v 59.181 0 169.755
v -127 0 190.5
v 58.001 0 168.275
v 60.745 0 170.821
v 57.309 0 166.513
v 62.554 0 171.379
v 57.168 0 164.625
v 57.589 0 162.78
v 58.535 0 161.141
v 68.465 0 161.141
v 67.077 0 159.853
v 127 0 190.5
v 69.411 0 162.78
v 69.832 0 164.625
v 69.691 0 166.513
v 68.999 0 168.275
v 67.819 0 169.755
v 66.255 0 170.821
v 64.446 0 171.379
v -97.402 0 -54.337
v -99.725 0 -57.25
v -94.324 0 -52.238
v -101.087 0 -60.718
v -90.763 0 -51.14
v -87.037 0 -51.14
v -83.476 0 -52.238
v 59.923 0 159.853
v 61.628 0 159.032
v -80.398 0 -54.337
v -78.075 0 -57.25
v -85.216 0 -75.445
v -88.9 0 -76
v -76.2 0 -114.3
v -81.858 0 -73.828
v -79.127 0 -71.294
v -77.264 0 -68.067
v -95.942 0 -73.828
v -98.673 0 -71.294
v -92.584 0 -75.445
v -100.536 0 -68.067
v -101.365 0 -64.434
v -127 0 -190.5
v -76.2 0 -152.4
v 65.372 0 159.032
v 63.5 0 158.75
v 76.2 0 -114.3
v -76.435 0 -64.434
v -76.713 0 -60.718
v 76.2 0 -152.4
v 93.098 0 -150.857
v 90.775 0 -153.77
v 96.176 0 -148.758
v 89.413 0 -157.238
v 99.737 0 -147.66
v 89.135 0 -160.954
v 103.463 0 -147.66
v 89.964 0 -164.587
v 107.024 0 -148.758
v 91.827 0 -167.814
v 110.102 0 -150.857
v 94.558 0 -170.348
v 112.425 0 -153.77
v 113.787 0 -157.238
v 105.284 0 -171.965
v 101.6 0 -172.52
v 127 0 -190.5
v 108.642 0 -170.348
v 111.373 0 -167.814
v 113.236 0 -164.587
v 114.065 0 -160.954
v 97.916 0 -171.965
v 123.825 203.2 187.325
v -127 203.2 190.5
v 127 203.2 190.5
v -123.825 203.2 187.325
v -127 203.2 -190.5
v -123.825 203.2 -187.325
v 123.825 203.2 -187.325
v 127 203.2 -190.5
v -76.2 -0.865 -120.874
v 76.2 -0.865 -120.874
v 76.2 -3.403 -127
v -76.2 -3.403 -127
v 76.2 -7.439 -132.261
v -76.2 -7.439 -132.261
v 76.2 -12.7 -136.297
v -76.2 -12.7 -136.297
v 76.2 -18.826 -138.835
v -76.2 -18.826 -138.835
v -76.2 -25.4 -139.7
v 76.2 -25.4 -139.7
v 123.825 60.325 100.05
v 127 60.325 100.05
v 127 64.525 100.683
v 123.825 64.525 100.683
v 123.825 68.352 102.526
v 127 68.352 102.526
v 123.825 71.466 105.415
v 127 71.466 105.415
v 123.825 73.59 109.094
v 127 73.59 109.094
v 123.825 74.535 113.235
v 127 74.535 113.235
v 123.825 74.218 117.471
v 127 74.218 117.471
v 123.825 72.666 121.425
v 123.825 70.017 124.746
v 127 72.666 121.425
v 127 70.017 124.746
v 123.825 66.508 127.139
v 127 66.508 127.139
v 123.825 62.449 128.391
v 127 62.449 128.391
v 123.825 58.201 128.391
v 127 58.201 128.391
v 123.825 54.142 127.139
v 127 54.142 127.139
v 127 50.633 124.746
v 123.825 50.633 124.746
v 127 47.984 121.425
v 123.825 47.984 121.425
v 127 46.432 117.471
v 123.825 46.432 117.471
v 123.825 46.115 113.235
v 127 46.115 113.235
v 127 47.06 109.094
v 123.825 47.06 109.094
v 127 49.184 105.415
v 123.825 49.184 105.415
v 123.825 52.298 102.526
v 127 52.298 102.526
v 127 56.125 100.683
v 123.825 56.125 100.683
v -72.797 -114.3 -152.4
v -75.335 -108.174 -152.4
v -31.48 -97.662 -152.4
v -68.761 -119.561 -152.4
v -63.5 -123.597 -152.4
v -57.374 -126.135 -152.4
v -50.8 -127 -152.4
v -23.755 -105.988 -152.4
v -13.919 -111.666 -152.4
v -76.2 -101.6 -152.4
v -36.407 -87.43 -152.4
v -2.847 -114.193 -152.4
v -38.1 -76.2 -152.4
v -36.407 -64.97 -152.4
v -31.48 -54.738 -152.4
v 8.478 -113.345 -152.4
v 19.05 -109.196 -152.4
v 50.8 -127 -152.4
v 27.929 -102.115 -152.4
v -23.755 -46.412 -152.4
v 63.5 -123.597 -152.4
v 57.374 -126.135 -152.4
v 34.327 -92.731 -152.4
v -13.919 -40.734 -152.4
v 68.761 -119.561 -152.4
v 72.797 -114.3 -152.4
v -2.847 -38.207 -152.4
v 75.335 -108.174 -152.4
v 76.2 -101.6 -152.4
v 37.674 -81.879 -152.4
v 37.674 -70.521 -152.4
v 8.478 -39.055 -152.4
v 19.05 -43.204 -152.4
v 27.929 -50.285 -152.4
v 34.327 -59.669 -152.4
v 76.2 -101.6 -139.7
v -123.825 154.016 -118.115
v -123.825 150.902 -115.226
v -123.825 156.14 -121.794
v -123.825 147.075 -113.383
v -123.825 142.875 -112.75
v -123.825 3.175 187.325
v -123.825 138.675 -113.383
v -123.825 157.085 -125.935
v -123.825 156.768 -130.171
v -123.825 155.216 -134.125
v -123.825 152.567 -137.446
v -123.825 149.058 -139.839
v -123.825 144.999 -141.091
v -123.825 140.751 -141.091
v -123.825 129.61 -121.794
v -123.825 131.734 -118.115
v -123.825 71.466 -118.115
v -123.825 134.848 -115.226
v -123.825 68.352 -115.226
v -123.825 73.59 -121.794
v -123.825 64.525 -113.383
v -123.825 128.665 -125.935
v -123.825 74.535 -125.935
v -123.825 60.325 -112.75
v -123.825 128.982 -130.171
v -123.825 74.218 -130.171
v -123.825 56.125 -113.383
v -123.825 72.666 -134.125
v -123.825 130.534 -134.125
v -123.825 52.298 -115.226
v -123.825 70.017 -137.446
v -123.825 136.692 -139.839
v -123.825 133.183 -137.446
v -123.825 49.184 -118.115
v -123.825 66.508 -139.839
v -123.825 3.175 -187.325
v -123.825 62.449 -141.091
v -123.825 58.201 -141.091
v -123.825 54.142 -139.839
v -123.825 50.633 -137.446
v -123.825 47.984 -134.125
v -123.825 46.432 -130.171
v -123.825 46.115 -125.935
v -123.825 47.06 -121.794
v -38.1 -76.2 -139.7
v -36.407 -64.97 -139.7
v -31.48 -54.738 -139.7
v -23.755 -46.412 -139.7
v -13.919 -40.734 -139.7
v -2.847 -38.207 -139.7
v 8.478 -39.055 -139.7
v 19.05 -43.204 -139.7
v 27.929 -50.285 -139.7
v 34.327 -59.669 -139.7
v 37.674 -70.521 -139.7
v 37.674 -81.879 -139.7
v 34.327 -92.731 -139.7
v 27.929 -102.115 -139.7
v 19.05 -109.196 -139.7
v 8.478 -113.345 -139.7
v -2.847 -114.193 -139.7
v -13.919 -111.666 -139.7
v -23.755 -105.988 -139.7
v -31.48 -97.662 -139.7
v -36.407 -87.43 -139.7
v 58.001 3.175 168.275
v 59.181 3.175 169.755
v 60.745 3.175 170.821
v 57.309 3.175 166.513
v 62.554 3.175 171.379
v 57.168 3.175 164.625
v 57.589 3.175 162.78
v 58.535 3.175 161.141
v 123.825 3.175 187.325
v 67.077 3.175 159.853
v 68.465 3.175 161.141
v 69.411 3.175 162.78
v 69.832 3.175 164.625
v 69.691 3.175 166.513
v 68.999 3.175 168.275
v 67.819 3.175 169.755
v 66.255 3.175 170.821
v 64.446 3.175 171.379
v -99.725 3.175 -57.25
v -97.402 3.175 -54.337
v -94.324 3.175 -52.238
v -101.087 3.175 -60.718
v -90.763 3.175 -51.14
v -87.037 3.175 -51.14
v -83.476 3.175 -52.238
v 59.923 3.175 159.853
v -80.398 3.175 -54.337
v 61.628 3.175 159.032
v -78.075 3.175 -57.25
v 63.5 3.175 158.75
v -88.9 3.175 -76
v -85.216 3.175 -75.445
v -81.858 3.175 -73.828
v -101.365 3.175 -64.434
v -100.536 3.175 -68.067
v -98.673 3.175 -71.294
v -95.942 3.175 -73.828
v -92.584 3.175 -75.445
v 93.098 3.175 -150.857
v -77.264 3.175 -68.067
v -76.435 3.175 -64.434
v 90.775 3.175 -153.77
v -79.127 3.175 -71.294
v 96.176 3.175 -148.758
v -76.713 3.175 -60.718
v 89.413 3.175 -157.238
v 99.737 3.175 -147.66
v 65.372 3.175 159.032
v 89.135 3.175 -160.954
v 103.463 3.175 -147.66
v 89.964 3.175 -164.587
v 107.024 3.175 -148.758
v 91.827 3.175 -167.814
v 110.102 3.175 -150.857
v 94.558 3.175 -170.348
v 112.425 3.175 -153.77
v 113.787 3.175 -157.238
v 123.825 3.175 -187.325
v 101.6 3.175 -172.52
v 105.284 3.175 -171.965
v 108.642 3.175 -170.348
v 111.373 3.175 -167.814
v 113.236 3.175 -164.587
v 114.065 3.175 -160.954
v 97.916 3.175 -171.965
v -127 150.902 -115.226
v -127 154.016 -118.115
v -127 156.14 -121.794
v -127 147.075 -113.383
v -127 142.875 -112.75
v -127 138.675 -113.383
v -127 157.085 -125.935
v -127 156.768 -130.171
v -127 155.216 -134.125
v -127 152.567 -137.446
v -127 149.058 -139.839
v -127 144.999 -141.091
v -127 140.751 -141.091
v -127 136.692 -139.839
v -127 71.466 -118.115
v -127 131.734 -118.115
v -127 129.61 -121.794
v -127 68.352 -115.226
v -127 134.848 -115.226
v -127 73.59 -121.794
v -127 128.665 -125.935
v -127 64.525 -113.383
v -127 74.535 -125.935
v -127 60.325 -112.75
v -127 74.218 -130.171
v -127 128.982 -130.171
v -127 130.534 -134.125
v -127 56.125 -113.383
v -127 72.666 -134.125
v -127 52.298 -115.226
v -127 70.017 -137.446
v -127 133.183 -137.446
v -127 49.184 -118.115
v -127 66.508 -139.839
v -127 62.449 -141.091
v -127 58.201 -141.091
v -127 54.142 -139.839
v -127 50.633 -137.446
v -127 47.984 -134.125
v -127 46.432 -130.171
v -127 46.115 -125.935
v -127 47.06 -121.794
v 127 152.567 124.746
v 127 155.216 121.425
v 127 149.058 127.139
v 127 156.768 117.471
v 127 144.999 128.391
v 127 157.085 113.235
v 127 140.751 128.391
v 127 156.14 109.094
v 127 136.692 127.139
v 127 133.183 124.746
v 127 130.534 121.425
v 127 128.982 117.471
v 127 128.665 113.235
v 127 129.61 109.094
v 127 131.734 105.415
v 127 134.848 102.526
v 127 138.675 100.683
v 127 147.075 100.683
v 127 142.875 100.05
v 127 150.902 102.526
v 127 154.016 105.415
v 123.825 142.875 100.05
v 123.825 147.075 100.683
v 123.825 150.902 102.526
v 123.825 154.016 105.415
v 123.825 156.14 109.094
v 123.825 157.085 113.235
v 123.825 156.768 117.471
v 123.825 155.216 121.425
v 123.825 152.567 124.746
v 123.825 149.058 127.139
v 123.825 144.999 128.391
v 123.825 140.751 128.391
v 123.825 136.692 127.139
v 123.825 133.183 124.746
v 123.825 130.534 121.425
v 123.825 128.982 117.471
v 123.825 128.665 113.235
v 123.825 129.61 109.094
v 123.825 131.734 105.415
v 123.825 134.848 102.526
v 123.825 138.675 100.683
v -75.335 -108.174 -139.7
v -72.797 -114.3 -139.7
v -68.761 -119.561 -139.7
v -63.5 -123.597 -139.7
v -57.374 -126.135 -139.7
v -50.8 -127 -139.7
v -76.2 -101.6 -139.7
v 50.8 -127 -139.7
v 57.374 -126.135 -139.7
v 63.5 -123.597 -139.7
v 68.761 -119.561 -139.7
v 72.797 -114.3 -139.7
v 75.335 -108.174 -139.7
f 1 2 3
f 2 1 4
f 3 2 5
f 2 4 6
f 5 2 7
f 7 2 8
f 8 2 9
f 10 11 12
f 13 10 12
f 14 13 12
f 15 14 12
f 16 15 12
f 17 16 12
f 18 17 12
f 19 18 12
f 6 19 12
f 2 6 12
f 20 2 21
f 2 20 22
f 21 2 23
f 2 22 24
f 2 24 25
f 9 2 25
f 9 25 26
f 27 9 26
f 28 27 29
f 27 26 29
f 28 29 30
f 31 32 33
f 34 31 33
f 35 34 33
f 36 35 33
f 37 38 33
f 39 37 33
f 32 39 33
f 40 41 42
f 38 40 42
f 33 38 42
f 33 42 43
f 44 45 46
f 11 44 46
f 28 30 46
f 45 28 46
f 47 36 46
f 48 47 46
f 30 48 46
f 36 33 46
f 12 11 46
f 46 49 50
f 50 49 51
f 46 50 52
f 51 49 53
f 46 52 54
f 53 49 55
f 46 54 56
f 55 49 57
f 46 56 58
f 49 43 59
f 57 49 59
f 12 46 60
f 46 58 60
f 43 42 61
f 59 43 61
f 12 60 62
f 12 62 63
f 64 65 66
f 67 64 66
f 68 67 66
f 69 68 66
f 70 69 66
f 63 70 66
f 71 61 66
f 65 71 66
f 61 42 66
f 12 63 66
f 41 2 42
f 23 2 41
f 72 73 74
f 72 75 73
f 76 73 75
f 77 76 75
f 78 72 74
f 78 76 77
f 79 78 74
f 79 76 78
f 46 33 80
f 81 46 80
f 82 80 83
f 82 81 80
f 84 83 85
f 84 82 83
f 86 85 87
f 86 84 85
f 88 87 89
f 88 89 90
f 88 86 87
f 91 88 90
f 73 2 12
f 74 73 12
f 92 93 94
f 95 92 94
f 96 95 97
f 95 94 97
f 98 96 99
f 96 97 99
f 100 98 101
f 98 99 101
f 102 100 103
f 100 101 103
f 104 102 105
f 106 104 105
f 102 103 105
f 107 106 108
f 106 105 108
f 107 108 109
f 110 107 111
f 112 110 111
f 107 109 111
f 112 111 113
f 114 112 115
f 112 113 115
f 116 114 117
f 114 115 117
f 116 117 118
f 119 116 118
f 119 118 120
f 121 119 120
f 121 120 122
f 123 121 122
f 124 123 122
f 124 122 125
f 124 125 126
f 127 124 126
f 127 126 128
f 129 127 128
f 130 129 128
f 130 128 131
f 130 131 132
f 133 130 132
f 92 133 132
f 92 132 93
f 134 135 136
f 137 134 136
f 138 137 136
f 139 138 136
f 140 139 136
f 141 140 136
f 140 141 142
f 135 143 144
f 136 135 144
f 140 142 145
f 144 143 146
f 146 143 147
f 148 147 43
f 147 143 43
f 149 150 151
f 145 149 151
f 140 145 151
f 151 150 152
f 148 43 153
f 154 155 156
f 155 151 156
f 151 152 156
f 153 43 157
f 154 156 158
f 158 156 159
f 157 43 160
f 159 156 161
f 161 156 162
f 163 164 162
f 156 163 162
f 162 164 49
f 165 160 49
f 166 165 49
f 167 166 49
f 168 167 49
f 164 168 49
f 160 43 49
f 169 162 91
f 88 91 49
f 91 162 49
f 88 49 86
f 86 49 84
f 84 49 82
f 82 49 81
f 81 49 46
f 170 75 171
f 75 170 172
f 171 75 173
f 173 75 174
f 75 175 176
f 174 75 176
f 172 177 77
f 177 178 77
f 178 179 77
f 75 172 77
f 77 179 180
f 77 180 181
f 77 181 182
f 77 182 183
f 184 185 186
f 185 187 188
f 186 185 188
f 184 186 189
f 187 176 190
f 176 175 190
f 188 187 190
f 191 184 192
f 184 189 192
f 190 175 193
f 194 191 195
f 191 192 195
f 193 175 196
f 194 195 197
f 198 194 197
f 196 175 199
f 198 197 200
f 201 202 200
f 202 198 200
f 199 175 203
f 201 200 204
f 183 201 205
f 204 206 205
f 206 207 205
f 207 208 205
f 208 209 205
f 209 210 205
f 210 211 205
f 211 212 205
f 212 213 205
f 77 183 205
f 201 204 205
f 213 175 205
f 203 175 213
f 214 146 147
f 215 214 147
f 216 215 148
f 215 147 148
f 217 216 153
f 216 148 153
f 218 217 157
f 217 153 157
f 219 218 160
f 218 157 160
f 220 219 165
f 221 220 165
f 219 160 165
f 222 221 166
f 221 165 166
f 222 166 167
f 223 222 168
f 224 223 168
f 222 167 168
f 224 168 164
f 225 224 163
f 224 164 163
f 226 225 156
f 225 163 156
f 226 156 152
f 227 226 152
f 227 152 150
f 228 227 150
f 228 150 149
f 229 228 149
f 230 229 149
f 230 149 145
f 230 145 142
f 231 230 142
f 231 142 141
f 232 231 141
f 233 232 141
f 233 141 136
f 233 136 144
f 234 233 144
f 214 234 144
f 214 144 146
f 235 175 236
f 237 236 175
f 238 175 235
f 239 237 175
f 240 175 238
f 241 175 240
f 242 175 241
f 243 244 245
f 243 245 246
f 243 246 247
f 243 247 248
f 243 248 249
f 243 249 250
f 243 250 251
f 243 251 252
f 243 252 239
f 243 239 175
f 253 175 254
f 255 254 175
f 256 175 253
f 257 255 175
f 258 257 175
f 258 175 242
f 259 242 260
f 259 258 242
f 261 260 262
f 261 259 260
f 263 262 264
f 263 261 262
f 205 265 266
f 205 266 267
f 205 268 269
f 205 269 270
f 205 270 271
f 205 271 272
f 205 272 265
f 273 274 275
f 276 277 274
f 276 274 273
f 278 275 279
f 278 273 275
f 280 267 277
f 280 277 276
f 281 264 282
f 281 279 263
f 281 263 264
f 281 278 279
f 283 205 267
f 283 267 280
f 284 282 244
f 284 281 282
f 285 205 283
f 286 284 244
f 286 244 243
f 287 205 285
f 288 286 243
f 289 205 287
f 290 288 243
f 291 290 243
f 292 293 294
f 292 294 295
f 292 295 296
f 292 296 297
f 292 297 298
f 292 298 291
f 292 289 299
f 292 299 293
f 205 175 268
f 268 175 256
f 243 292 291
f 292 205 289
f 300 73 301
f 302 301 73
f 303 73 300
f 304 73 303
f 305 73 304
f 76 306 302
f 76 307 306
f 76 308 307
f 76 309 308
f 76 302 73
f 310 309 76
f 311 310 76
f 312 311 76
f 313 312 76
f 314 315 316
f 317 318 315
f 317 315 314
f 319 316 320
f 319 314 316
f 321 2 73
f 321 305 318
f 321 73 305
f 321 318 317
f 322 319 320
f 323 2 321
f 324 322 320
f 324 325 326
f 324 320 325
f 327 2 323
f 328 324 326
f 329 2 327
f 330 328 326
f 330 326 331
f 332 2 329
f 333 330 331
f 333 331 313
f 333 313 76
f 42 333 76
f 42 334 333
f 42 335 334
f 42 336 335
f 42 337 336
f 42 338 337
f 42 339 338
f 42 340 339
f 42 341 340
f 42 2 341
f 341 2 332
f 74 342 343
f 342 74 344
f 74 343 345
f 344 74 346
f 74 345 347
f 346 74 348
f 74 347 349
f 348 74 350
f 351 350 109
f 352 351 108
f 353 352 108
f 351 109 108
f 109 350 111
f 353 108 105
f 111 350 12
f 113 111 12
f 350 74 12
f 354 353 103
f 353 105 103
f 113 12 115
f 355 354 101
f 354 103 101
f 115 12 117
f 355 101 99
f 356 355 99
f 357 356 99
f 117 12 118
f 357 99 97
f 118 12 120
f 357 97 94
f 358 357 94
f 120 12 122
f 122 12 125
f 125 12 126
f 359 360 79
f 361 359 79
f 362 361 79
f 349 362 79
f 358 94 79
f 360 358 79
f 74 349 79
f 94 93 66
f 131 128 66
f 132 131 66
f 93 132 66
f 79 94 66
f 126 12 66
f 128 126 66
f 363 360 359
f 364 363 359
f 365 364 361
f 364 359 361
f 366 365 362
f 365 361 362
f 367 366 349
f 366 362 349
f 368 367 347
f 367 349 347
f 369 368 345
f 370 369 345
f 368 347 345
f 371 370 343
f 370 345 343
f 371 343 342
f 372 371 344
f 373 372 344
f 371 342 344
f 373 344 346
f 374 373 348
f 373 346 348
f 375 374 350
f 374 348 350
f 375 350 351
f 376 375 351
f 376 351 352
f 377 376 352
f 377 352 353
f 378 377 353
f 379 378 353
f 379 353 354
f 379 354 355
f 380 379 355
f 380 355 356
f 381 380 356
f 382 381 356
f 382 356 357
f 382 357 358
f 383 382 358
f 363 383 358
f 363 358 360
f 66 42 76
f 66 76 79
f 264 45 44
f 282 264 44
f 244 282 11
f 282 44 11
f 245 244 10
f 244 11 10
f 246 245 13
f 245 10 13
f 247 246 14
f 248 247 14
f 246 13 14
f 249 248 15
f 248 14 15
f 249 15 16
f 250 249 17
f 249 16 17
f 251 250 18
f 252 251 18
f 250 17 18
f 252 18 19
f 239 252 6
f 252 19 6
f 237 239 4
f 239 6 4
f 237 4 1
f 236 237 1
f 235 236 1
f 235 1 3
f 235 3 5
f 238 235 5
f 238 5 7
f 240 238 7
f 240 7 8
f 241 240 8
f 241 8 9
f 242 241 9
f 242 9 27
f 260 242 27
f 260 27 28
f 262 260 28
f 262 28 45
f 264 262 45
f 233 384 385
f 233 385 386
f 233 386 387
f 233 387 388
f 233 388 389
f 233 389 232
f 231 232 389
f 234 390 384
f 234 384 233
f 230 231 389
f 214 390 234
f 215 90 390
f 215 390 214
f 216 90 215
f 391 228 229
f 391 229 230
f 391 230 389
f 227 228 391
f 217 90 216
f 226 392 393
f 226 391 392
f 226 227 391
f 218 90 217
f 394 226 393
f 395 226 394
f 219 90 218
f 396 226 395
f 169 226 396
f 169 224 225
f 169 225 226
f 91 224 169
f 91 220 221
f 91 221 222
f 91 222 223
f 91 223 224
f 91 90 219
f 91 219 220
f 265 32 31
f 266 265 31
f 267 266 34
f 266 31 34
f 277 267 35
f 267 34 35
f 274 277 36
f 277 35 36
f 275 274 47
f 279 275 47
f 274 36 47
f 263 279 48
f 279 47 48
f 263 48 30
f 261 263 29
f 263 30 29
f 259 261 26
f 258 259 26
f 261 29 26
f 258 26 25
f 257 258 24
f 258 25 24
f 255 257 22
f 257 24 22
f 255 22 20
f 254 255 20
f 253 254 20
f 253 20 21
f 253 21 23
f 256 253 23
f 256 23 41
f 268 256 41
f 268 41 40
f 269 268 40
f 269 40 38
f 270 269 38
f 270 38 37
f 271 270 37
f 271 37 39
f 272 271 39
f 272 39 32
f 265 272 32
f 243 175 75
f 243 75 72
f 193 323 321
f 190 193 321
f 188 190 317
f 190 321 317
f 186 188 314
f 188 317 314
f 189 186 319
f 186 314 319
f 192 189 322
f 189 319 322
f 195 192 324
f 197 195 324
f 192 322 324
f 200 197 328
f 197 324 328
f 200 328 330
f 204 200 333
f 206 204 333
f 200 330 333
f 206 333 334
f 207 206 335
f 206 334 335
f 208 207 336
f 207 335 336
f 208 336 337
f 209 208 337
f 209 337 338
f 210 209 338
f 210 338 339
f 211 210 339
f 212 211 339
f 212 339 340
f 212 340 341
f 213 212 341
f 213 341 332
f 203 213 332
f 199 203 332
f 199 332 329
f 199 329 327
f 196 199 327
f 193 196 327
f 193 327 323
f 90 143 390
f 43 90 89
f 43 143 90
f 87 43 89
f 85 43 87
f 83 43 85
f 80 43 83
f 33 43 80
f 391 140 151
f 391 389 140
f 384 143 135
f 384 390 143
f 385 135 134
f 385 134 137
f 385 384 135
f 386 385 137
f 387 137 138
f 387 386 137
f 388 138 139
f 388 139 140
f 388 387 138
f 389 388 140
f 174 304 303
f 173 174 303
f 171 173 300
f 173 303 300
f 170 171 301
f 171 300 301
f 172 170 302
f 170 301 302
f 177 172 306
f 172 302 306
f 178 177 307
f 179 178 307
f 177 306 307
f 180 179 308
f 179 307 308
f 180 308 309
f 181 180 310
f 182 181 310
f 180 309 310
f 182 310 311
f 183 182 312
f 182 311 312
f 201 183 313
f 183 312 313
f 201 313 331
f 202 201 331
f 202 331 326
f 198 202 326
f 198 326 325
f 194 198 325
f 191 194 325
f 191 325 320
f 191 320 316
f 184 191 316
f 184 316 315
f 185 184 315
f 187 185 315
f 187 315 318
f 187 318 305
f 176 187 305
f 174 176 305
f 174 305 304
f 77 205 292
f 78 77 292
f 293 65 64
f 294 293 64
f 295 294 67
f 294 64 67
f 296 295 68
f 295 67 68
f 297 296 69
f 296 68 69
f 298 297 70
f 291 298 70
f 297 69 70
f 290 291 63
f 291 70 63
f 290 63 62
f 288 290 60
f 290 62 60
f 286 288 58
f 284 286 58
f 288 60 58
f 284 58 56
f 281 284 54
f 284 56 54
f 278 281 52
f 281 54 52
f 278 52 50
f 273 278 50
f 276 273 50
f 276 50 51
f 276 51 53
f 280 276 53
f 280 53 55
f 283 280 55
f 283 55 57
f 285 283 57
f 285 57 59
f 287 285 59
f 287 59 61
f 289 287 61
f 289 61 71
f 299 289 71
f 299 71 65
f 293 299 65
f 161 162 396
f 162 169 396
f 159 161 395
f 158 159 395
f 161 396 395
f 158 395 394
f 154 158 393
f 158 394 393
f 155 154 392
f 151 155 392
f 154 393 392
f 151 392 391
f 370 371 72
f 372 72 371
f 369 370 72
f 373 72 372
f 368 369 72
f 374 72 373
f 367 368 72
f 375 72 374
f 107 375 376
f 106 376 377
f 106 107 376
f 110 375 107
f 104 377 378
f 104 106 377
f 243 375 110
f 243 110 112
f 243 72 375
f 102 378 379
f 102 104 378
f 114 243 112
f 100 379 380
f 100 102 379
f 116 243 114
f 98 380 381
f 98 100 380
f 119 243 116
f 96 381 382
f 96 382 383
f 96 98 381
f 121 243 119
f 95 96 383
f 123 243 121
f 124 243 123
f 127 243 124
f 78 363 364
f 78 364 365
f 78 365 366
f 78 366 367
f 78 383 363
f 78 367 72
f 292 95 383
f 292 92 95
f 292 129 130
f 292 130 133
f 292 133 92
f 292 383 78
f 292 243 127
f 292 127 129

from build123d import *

# Parameters (mm, degrees)
SKETCH1_W           = 254
SKETCH1_H           = 381
BOSS_EXTRUDE1_DEPTH = 203.2
SHELL1_T            = -3.175
CUT_EXTRUDE1_REACH  = 378.957
SKETCH2_R           = 14.25
CUT_EXTRUDE2_REACH  = 378.957
SKETCH3_R           = 14.25
SKETCH4_W           = 152.4
SKETCH4_H           = 12.7
BOSS_EXTRUDE2_DEPTH = 127
CUT_EXTRUDE3_REACH  = 420.33
SKETCH5_R           = 38.1
FILLET1_R           = 25.4
FILLET2_R           = 25.4
CUT_EXTRUDE4_REACH  = 308.12
SKETCH6_R           = 6.35
SKETCH6_R_2         = 12.5


with BuildPart() as part:
    # Sketch1 → Boss-Extrude1 (new body)
    with BuildSketch(Plane(origin=(0, 0, 0), x_dir=(1, 0, 0), z_dir=(0, 1, 0))):
        Rectangle(SKETCH1_W, SKETCH1_H)
    extrude(amount=BOSS_EXTRUDE1_DEPTH)

    # Shell1
    shell1_openings = [part.faces().sort_by_distance(p)[0] for p in [
        (0, 203.2, 0),
    ]]
    offset(amount=SHELL1_T, openings=shell1_openings, kind=Kind.INTERSECTION)

    # Sketch2 → Cut-Extrude1 (cut, up to next)
    with BuildSketch(Plane(origin=(127, 0, 0), x_dir=(0, 0, -1), z_dir=(1, 0, 0)), mode=Mode.PRIVATE) as cut_extrude1_sk1:
        with Locations((-114.3, 142.875)):
            Circle(SKETCH2_R)
    cut_extrude1_tool1 = extrude(cut_extrude1_sk1.sketch, amount=-CUT_EXTRUDE1_REACH, mode=Mode.PRIVATE) & part.part
    # Sketch2 → Cut-Extrude1 (cut, up to next)
    with BuildSketch(Plane(origin=(127, 0, 0), x_dir=(0, 0, -1), z_dir=(1, 0, 0)), mode=Mode.PRIVATE) as cut_extrude1_sk2:
        with Locations((-114.3, 60.325)):
            Circle(SKETCH2_R)
    cut_extrude1_tool2 = extrude(cut_extrude1_sk2.sketch, amount=-CUT_EXTRUDE1_REACH, mode=Mode.PRIVATE) & part.part
    add(cut_extrude1_tool1.solids().sort_by_distance((127, 142.875, 114.3))[0], mode=Mode.SUBTRACT)
    add(cut_extrude1_tool2.solids().sort_by_distance((127, 60.325, 114.3))[0], mode=Mode.SUBTRACT)

    # Sketch3 → Cut-Extrude2 (cut, up to next)
    with BuildSketch(Plane.ZY.offset(127), mode=Mode.PRIVATE) as cut_extrude2_sk1:
        with Locations((-127, 142.875)):
            Circle(SKETCH3_R)
    cut_extrude2_tool1 = extrude(cut_extrude2_sk1.sketch, amount=-CUT_EXTRUDE2_REACH, mode=Mode.PRIVATE) & part.part
    # Sketch3 → Cut-Extrude2 (cut, up to next)
    with BuildSketch(Plane.ZY.offset(127), mode=Mode.PRIVATE) as cut_extrude2_sk2:
        with Locations((-127, 60.325)):
            Circle(SKETCH3_R)
    cut_extrude2_tool2 = extrude(cut_extrude2_sk2.sketch, amount=-CUT_EXTRUDE2_REACH, mode=Mode.PRIVATE) & part.part
    add(cut_extrude2_tool1.solids().sort_by_distance((-127, 142.875, -127))[0], mode=Mode.SUBTRACT)
    add(cut_extrude2_tool2.solids().sort_by_distance((-127, 60.325, -127))[0], mode=Mode.SUBTRACT)

    # Sketch4 → Boss-Extrude2 (add)
    with BuildSketch(Plane.XZ):
        with Locations((0, -146.05)):
            Rectangle(SKETCH4_W, SKETCH4_H)
    extrude(amount=BOSS_EXTRUDE2_DEPTH)

    # Sketch5 → Cut-Extrude3 (cut, up to next)
    with BuildSketch(Plane(origin=(0, 0, -152.4), x_dir=(-1, 0, 0), z_dir=(0, 0, -1)), mode=Mode.PRIVATE) as cut_extrude3_sk1:
        with Locations((0, -76.2)):
            Circle(SKETCH5_R)
    cut_extrude3_tool1 = extrude(cut_extrude3_sk1.sketch, amount=-CUT_EXTRUDE3_REACH, mode=Mode.PRIVATE) & part.part
    add(cut_extrude3_tool1.solids().sort_by_distance((0, -76.2, -152.4))[0], mode=Mode.SUBTRACT)

    # Fillet1
    fillet1_edges = [part.edges().sort_by_distance(p)[0] for p in [
        (-76.2, -127, -146.05),
        (76.2, -127, -146.05),
    ]]
    fillet(fillet1_edges, radius=FILLET1_R)

    # Fillet2
    fillet2_edges = [part.edges().sort_by_distance(p)[0] for p in [
        (0, 0, -139.7),
    ]]
    fillet(fillet2_edges, radius=FILLET2_R)

    # Sketch6 → Cut-Extrude4 (cut, up to next)
    with BuildSketch(Plane.XZ, mode=Mode.PRIVATE) as cut_extrude4_sk1:
        with Locations((63.5, 165.1)):
            Circle(SKETCH6_R)
    cut_extrude4_tool1 = extrude(cut_extrude4_sk1.sketch, amount=-CUT_EXTRUDE4_REACH, mode=Mode.PRIVATE) & part.part
    # Sketch6 → Cut-Extrude4 (cut, up to next)
    with BuildSketch(Plane.XZ, mode=Mode.PRIVATE) as cut_extrude4_sk2:
        with Locations((-88.9, -63.5)):
            Circle(SKETCH6_R_2)
    cut_extrude4_tool2 = extrude(cut_extrude4_sk2.sketch, amount=-CUT_EXTRUDE4_REACH, mode=Mode.PRIVATE) & part.part
    # Sketch6 → Cut-Extrude4 (cut, up to next)
    with BuildSketch(Plane.XZ, mode=Mode.PRIVATE) as cut_extrude4_sk3:
        with Locations((101.6, -160.02)):
            Circle(SKETCH6_R_2)
    cut_extrude4_tool3 = extrude(cut_extrude4_sk3.sketch, amount=-CUT_EXTRUDE4_REACH, mode=Mode.PRIVATE) & part.part
    add(cut_extrude4_tool1.solids().sort_by_distance((63.5, 0, 165.1))[0], mode=Mode.SUBTRACT)
    add(cut_extrude4_tool2.solids().sort_by_distance((-88.9, 0, -63.5))[0], mode=Mode.SUBTRACT)
    add(cut_extrude4_tool3.solids().sort_by_distance((101.6, 0, -160.02))[0], mode=Mode.SUBTRACT)


solid = part.part
